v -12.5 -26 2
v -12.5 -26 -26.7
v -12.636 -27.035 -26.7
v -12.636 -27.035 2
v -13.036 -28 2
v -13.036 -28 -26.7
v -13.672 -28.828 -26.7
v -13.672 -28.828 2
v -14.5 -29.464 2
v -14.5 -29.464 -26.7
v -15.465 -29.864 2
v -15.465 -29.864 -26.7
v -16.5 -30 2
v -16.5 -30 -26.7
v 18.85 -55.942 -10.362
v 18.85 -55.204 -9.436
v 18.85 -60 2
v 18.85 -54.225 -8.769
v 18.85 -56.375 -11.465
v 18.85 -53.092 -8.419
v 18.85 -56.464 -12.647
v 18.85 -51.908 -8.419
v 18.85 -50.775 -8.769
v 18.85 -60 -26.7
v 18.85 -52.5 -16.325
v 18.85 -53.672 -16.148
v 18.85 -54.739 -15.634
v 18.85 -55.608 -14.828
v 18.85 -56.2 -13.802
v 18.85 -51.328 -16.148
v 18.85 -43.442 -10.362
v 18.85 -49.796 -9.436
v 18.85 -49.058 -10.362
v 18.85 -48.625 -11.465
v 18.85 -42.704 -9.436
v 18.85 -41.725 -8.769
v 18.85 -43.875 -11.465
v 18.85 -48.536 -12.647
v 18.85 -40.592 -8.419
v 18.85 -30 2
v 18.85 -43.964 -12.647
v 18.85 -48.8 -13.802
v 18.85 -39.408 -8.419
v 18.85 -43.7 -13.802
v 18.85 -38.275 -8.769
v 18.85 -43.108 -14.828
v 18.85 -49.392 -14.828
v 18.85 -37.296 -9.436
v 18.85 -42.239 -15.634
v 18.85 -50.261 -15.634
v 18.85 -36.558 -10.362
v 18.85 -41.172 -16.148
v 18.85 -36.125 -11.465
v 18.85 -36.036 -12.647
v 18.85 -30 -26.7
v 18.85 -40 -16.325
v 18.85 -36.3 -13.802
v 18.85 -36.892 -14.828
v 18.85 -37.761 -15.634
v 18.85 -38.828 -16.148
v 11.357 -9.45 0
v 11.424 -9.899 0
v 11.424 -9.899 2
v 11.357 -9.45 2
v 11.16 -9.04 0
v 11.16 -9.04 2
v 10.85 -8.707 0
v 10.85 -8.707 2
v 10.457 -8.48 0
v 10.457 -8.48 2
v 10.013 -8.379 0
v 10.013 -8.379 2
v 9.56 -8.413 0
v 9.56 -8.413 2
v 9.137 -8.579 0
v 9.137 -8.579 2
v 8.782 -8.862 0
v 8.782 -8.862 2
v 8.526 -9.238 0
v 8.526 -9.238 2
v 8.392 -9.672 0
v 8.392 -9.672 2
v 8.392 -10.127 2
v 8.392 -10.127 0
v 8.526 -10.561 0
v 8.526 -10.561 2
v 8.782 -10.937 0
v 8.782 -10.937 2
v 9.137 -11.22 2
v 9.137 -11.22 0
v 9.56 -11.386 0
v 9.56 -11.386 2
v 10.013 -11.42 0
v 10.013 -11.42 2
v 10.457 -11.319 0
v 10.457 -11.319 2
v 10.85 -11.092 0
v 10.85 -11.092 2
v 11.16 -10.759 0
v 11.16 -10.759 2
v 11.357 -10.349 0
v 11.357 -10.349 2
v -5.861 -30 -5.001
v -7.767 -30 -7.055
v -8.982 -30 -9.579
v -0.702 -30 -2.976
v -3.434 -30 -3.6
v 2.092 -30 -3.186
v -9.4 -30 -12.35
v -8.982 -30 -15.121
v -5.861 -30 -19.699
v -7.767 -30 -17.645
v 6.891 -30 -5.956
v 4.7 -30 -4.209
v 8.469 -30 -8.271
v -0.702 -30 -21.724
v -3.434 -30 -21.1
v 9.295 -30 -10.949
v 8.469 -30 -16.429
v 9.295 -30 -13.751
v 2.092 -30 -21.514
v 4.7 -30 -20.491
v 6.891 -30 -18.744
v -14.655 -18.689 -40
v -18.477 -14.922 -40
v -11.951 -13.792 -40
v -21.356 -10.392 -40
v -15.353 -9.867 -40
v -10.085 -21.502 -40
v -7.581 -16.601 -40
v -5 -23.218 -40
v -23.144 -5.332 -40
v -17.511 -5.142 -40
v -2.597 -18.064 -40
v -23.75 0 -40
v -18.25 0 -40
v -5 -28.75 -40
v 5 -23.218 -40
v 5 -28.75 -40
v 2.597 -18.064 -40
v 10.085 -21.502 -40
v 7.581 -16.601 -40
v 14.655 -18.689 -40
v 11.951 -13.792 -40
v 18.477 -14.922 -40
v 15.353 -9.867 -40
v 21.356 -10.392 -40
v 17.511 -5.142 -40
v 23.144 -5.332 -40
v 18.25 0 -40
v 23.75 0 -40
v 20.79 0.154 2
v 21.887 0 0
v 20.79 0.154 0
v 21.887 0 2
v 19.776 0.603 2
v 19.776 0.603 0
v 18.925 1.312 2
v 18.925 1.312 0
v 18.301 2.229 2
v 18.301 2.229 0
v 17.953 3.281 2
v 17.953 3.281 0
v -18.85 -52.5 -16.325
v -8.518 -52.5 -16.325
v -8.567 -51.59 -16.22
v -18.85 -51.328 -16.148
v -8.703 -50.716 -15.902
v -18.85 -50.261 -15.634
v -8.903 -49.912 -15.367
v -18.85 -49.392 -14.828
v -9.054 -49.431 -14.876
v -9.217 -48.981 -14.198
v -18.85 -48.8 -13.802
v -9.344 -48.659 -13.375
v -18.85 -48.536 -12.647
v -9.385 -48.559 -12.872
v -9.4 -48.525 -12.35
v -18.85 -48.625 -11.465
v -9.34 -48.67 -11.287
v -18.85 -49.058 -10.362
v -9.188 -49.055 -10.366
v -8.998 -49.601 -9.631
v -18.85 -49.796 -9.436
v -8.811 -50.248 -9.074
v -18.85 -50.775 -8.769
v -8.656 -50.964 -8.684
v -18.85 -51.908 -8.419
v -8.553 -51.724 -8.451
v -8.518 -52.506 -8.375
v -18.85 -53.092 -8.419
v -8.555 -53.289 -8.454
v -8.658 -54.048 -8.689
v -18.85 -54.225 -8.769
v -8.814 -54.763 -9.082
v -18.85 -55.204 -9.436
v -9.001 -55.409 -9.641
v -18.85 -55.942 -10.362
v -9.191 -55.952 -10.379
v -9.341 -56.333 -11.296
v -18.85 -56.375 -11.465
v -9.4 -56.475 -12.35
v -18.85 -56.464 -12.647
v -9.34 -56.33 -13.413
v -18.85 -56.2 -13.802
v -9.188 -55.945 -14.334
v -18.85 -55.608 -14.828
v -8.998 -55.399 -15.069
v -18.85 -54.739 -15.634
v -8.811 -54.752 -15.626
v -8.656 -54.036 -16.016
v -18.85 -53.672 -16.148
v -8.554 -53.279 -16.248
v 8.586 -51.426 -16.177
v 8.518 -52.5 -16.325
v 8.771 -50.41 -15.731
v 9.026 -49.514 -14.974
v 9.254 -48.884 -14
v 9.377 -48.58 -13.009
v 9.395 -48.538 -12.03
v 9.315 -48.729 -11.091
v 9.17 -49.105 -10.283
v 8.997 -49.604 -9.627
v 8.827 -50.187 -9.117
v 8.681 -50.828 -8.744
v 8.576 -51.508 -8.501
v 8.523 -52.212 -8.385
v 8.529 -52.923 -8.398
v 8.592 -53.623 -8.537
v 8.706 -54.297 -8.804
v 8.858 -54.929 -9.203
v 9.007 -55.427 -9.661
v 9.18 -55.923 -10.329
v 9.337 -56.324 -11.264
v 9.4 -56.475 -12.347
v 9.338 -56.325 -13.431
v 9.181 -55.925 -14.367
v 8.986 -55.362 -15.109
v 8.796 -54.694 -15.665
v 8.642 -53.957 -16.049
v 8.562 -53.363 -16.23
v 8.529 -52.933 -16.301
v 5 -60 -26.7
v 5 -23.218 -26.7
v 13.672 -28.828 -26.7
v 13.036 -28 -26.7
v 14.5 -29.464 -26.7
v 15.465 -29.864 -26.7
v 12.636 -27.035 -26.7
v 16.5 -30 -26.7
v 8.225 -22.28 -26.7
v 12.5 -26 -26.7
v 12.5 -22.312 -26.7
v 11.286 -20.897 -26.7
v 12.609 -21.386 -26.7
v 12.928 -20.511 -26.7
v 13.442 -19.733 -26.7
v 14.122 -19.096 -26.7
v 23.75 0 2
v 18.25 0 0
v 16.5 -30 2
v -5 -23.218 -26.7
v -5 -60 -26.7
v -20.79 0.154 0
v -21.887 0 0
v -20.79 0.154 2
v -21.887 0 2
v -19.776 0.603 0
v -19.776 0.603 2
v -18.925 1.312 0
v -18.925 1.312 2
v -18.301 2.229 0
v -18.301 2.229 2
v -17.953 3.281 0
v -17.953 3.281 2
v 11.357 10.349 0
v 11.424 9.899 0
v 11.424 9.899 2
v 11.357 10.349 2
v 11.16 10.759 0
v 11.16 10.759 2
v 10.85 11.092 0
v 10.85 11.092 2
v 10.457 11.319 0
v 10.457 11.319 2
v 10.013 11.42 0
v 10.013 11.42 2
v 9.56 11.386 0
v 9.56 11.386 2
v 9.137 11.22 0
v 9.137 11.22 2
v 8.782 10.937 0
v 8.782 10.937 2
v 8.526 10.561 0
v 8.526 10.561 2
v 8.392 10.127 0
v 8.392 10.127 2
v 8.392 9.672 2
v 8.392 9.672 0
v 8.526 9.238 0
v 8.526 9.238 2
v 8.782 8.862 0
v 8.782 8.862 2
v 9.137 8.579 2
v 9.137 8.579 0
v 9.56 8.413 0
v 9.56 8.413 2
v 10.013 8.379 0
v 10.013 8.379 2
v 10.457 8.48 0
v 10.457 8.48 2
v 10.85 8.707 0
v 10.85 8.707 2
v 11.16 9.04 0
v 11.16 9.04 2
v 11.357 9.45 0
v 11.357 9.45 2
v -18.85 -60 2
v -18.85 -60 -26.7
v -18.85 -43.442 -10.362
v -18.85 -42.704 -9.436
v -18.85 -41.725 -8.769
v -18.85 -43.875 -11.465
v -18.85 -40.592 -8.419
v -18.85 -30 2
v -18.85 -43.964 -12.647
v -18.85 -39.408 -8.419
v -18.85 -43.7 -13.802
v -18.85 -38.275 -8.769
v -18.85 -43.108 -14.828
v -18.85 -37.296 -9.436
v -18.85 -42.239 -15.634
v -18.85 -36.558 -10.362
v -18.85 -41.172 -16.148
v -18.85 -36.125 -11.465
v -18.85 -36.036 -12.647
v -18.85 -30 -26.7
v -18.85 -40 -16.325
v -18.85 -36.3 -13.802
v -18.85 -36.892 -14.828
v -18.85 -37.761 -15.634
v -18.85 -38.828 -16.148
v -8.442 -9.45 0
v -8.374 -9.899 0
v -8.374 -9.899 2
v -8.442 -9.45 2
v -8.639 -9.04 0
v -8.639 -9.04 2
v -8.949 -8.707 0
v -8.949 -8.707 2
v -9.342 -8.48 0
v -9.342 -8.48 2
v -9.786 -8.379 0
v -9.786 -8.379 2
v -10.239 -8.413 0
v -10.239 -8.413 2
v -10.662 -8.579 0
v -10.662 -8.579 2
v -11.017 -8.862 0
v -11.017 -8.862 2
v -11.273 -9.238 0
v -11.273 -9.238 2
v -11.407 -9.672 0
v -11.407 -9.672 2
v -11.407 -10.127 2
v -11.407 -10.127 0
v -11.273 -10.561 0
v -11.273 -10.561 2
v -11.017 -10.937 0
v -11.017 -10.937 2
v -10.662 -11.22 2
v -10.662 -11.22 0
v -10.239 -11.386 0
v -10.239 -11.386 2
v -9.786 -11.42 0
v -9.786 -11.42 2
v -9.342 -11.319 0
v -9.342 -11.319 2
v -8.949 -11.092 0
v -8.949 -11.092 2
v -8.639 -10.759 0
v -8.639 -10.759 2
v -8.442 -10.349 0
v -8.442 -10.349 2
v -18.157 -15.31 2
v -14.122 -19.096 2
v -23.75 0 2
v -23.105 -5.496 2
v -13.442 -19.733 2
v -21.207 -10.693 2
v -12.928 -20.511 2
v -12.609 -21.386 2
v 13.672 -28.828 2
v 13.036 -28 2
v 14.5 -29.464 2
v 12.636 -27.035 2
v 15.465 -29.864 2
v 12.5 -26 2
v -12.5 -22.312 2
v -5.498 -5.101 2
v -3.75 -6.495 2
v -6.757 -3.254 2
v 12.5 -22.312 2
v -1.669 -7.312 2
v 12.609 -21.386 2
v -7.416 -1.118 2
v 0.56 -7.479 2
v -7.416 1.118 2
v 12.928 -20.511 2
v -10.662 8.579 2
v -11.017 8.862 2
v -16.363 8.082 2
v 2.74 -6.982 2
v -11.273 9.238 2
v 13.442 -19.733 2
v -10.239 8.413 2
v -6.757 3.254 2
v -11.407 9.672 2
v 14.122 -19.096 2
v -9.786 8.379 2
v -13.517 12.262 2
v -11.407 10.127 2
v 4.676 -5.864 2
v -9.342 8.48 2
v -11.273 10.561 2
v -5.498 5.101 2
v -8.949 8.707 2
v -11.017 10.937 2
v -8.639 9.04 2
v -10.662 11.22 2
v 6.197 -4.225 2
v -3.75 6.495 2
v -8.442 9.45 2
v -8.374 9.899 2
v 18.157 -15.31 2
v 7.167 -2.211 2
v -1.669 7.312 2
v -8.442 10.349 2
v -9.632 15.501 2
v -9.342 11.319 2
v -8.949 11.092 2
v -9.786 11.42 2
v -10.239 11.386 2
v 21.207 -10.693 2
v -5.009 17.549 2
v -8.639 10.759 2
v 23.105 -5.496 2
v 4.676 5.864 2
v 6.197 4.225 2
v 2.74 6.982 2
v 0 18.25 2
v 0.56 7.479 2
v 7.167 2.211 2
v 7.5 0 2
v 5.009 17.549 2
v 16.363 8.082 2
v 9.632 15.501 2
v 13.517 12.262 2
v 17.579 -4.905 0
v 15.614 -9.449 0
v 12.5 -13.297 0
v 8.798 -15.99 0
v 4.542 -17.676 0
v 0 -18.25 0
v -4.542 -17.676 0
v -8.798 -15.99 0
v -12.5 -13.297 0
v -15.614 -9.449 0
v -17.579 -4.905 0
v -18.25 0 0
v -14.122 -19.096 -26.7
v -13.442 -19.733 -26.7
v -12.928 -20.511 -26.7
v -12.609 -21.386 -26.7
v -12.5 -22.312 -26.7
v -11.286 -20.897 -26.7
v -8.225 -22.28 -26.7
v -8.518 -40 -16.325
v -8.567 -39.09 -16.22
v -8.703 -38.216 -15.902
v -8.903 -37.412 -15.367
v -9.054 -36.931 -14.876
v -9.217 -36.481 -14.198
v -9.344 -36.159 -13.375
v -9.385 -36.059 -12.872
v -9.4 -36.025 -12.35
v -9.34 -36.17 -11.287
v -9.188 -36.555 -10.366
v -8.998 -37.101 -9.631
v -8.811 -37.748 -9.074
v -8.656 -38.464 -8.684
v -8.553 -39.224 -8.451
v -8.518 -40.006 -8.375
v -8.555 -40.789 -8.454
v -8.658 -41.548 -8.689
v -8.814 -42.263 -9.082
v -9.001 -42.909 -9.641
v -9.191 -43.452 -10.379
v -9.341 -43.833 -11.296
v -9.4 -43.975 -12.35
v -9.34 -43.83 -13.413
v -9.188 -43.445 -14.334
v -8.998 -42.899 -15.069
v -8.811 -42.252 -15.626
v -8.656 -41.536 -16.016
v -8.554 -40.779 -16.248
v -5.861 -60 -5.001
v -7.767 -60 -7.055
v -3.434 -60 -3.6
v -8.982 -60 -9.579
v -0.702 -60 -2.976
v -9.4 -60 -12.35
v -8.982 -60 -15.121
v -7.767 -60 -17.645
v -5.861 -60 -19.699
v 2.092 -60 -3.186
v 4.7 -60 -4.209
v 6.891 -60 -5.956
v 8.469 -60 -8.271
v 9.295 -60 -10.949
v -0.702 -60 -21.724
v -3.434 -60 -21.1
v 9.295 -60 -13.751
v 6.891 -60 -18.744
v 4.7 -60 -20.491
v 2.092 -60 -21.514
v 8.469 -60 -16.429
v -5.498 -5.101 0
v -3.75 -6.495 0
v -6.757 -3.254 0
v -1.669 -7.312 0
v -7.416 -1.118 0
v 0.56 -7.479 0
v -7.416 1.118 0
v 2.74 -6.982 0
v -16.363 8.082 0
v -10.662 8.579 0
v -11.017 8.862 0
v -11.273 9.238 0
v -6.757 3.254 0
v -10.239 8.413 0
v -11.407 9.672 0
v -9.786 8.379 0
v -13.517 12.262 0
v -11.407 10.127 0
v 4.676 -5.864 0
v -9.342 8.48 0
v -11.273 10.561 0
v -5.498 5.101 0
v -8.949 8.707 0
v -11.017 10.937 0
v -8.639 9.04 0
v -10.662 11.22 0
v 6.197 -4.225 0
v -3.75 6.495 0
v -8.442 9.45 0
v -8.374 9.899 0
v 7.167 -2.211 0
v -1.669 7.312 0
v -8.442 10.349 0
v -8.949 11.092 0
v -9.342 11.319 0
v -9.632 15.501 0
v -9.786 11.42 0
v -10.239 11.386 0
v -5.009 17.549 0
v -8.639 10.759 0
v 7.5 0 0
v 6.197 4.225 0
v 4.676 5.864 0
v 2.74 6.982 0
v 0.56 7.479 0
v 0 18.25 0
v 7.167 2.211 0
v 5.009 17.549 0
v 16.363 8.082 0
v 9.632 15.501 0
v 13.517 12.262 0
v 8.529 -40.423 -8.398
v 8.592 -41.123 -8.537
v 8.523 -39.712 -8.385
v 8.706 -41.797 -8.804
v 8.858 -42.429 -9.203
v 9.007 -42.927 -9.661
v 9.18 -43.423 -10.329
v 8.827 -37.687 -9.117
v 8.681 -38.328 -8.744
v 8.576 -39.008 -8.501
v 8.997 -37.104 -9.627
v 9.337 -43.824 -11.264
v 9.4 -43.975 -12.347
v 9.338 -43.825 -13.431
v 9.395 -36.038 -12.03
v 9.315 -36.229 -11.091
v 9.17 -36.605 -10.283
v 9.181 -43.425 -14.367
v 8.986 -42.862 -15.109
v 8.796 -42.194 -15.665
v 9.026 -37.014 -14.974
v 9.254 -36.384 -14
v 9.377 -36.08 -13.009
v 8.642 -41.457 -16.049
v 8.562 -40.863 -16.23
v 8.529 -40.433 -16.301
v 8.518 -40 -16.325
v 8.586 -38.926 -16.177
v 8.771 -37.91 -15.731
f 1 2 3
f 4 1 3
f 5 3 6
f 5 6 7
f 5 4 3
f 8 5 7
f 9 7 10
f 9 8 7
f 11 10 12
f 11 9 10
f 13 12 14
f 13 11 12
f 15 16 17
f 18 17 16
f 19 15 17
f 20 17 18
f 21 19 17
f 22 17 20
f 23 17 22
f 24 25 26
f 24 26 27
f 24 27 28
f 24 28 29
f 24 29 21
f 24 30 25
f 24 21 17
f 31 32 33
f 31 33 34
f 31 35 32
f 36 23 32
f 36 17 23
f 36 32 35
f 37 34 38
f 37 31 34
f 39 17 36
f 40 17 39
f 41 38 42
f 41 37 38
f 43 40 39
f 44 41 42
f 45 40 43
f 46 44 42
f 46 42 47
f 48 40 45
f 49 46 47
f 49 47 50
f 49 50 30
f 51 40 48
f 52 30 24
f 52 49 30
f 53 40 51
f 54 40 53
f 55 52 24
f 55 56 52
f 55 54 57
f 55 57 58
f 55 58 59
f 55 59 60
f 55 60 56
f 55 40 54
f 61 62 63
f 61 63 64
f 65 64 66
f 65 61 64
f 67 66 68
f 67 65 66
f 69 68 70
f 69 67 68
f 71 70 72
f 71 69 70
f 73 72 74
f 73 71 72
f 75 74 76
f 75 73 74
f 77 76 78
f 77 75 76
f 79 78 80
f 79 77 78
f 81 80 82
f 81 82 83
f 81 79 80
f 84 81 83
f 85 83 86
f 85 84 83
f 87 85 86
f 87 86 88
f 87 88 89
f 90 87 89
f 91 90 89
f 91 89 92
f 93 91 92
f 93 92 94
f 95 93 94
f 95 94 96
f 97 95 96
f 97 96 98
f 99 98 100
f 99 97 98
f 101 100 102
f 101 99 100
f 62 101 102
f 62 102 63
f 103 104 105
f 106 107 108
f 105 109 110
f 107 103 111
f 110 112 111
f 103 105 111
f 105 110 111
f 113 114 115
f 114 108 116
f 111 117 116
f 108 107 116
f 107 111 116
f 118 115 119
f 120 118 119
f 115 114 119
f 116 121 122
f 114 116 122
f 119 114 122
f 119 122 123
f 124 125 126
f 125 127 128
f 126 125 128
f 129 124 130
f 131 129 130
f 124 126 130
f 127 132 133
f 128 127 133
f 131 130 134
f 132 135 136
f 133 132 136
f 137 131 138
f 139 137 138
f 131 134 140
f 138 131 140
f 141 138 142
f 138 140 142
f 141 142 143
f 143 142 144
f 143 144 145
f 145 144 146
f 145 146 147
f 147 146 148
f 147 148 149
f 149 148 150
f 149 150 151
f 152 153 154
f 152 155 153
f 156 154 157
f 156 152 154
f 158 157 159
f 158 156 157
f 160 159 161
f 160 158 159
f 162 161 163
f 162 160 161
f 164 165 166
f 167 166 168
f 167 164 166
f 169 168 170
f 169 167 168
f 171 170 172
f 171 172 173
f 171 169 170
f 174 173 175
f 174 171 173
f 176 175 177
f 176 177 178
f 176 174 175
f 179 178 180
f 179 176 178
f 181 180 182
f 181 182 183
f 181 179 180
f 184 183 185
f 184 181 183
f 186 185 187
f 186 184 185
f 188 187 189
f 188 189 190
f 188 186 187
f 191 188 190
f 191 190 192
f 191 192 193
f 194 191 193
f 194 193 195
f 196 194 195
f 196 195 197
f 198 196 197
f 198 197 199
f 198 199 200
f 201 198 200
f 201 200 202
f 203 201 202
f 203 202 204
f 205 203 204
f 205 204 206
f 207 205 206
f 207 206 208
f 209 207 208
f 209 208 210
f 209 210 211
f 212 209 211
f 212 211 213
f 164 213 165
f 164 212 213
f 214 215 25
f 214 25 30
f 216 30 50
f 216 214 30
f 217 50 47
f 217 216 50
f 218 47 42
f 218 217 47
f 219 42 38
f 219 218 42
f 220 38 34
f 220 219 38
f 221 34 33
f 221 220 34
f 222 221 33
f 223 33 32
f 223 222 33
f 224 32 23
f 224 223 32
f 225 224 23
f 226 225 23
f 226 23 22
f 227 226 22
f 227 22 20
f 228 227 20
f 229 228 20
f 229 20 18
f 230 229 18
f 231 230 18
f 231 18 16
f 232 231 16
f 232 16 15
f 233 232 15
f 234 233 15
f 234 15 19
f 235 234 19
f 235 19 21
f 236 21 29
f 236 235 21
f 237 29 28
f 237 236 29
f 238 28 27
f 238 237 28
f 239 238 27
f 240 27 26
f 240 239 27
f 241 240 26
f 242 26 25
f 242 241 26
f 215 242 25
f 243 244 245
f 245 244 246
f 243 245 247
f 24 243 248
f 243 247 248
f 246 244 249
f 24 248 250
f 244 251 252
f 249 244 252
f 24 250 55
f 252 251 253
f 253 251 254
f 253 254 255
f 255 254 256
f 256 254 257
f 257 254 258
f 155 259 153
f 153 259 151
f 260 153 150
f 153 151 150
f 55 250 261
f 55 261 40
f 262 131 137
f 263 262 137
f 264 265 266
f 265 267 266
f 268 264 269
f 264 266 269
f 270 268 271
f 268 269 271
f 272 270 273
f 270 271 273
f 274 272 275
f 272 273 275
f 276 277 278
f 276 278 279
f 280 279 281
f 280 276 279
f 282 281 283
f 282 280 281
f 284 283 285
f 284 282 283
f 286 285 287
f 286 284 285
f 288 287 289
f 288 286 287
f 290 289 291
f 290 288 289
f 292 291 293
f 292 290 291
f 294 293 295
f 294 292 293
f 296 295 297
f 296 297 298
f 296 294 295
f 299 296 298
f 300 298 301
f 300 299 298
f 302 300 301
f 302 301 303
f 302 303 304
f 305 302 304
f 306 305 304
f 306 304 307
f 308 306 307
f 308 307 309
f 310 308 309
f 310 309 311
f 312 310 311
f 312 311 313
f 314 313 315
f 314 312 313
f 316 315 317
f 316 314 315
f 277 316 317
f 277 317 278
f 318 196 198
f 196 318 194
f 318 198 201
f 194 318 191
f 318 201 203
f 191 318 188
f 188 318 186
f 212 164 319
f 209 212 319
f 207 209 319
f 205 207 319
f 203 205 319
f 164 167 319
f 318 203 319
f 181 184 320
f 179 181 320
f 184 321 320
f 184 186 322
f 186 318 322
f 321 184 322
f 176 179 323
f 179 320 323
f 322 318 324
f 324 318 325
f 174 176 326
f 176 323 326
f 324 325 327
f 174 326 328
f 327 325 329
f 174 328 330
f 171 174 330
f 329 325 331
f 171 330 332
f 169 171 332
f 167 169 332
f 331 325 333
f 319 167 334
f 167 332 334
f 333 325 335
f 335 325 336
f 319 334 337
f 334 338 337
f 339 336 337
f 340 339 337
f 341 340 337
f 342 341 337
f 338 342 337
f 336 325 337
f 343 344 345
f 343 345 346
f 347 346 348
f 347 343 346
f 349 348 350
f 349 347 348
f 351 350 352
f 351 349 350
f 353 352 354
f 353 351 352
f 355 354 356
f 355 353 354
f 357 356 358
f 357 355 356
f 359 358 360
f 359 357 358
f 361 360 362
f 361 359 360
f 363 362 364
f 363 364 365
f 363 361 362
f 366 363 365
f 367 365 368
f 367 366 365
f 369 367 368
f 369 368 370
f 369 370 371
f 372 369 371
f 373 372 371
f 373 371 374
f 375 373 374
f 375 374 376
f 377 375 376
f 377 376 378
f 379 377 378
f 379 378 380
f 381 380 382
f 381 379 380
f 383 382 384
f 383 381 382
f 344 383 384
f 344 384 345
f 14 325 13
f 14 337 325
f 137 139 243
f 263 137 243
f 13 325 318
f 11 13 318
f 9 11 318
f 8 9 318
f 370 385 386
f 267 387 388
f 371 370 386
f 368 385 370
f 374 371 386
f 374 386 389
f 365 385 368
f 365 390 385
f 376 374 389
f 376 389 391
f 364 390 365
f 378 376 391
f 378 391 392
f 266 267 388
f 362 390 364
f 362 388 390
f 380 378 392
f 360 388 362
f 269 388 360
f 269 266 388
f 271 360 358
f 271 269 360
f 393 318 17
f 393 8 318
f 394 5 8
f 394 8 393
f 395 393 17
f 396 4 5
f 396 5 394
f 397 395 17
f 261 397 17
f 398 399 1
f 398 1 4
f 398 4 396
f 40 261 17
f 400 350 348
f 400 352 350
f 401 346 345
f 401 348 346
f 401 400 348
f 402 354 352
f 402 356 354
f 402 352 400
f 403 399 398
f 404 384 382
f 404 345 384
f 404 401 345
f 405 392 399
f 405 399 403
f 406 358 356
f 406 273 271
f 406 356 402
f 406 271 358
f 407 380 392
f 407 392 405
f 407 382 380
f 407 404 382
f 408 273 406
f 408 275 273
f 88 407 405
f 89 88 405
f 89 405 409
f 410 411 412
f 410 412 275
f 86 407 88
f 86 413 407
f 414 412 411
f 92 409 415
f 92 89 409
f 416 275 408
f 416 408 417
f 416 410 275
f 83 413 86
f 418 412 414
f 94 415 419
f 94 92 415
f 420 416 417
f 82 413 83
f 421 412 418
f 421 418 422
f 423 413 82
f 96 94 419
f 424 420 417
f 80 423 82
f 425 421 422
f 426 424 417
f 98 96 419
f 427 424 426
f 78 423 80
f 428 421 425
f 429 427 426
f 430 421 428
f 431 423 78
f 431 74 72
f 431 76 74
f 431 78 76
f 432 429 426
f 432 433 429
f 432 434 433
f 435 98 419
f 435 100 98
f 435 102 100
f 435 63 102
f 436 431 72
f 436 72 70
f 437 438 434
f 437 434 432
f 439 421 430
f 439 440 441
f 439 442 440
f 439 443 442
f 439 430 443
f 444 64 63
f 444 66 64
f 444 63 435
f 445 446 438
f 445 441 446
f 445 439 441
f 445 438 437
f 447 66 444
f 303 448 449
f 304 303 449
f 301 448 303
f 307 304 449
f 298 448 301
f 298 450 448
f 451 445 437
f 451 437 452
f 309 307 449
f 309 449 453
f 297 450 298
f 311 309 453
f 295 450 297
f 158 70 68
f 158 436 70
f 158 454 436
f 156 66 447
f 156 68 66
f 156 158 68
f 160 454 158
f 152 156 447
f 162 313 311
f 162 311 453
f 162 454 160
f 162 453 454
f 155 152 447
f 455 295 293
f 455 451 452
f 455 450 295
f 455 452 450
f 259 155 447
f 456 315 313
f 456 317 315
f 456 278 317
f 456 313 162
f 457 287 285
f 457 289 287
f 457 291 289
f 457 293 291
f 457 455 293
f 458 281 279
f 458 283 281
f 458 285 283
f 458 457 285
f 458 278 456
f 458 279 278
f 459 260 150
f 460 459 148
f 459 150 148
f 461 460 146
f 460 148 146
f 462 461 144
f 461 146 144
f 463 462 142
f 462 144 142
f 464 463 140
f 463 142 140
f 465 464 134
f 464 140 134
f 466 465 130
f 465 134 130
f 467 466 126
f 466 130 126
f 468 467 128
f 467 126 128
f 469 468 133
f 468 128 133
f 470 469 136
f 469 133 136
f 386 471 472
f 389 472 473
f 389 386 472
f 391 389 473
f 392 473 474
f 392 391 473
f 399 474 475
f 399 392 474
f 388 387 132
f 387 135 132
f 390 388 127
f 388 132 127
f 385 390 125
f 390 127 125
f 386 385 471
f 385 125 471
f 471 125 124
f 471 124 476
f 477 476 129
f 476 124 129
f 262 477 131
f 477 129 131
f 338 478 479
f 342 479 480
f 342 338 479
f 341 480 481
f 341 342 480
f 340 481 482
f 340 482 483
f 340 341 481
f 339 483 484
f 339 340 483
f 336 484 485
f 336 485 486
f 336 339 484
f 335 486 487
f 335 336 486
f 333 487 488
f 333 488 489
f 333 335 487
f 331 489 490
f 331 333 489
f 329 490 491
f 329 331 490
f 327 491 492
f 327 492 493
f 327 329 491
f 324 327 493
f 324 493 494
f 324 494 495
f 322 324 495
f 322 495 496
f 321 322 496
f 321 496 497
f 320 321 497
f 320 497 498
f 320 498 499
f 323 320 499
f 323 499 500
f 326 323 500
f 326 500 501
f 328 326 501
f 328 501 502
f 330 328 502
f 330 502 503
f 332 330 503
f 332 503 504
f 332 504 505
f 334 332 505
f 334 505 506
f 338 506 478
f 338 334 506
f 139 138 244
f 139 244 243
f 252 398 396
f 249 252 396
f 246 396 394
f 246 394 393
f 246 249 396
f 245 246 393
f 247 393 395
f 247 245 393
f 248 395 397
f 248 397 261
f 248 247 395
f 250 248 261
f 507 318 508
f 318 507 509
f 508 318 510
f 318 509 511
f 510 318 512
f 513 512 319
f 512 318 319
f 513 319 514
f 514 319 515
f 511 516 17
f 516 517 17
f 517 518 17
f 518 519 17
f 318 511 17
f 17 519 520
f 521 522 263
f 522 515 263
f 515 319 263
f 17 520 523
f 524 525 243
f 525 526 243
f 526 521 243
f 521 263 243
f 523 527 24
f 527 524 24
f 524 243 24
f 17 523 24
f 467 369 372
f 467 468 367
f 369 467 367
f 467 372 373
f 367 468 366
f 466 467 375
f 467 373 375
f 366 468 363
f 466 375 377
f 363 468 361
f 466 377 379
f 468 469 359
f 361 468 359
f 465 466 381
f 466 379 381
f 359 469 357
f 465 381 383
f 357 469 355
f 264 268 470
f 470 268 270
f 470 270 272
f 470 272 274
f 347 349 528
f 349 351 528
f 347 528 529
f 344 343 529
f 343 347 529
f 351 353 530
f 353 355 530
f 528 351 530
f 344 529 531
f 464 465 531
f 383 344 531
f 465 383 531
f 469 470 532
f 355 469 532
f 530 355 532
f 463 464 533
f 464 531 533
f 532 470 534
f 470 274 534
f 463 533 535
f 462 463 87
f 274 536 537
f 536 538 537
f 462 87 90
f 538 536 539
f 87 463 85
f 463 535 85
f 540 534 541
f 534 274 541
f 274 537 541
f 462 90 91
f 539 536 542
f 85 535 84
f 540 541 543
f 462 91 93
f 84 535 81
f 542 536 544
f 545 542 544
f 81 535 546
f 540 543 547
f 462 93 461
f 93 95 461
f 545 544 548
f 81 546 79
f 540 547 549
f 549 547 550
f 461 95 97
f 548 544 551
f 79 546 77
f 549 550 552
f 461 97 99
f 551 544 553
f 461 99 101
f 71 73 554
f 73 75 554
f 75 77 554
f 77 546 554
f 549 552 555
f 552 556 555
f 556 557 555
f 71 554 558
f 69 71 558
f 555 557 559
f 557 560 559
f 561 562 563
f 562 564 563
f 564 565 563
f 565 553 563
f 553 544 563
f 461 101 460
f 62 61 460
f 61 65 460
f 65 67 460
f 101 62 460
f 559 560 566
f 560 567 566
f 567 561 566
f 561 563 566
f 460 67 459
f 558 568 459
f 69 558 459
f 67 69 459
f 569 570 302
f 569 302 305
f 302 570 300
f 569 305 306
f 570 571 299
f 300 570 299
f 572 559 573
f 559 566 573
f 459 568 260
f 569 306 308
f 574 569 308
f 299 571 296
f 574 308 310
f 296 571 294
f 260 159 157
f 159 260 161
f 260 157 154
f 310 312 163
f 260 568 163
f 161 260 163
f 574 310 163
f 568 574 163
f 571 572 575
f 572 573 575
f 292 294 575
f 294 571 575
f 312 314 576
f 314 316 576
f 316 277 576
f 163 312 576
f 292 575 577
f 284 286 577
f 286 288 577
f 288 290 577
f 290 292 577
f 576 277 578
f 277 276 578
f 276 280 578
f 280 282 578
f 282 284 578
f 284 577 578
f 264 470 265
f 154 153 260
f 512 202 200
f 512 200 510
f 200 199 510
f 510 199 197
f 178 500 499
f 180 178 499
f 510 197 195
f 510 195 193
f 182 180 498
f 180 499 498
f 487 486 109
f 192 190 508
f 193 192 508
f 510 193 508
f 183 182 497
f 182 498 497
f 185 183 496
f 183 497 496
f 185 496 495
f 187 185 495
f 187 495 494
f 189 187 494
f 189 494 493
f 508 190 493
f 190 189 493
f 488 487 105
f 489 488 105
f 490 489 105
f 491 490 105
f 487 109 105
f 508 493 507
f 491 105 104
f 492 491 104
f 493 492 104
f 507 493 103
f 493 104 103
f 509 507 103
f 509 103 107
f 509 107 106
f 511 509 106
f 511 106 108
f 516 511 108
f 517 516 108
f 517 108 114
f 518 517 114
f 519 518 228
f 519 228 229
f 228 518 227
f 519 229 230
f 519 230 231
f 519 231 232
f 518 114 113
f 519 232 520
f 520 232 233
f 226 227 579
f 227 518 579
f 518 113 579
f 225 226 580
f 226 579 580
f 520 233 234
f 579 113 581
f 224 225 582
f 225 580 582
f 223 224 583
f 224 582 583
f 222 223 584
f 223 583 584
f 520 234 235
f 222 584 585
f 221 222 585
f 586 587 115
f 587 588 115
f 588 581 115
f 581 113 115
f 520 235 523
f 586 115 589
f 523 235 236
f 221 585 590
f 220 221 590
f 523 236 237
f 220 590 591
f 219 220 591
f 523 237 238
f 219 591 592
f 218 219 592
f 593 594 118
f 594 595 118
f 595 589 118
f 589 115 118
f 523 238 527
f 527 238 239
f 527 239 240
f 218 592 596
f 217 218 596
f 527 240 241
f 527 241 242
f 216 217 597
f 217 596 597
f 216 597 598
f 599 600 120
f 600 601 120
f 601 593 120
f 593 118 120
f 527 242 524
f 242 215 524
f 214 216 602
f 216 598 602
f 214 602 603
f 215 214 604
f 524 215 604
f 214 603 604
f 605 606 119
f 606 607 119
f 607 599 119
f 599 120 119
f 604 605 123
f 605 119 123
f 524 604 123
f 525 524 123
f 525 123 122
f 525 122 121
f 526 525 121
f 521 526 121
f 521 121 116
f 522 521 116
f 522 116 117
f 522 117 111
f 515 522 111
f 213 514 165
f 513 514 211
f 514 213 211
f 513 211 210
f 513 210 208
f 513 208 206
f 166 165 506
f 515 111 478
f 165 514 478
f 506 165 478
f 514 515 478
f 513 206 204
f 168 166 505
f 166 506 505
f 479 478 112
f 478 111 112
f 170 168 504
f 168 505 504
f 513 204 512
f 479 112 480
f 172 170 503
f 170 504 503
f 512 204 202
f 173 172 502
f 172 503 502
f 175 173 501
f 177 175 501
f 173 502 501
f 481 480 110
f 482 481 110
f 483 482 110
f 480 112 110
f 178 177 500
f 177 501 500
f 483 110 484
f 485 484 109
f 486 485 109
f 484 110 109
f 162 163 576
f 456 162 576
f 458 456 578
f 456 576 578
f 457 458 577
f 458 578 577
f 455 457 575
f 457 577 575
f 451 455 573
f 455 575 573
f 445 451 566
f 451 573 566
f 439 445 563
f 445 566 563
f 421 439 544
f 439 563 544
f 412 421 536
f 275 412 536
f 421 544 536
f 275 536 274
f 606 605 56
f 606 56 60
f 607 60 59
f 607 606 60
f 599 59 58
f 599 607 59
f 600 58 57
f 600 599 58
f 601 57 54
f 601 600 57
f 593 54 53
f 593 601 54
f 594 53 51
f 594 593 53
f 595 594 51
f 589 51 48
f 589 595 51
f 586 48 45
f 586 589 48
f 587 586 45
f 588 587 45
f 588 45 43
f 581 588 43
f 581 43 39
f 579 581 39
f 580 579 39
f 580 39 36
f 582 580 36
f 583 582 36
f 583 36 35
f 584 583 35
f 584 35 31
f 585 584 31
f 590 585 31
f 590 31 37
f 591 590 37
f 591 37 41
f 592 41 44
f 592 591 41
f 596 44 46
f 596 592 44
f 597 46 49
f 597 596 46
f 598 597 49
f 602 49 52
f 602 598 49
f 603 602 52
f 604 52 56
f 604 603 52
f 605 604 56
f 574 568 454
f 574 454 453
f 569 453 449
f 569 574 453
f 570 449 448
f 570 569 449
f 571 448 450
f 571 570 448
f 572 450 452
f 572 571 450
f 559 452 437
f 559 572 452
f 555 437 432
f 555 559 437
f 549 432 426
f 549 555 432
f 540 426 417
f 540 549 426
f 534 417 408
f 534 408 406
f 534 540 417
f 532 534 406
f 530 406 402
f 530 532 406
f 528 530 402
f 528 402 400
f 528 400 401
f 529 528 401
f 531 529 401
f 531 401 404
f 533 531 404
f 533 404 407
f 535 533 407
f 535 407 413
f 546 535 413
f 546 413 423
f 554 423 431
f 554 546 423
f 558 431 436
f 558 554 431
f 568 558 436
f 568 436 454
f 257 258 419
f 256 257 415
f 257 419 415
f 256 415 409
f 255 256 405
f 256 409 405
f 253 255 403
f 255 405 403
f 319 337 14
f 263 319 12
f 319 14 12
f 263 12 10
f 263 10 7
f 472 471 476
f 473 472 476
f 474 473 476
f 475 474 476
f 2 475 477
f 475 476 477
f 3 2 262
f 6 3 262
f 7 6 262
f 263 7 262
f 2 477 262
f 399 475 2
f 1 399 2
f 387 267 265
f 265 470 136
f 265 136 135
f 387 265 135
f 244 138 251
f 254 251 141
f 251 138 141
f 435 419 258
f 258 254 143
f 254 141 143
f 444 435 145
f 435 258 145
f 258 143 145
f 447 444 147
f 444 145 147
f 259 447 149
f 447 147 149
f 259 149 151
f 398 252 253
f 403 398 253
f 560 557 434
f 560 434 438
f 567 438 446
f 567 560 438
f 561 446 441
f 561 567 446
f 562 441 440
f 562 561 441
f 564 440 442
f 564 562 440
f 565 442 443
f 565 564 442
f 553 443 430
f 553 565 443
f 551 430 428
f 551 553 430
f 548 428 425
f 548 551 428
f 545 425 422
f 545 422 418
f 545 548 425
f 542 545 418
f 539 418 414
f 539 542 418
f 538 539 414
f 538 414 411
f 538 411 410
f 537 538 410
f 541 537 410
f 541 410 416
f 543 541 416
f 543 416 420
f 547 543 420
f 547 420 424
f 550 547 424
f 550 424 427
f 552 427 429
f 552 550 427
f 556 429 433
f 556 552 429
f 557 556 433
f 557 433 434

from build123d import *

# Parameters (mm, degrees)
SKETCH2_R               = 1.525
SKETCH2_R_2             = 7.5
BOSS_EXTRUDE3_DEPTH     = 2
BOSS_EXTRUDE4_START     = -40
BOSS_EXTRUDE4_DEPTH     = 42
BOSS_EXTRUDE6_START     = -30
SKETCH7_W               = 37.7
SKETCH7_H               = 28.7
SKETCH7_R               = 9.4
BOSS_EXTRUDE6_DEPTH     = 30
BOSS_EXTRUDE7_START     = -26.7
BOSS_EXTRUDE7_DEPTH     = 26.7
CUT_EXTRUDE1_DEPTH      = 76.921423195
CUT_EXTRUDE1_DEPTH_BACK = 76.921423195
SKETCH6_R               = 3.975
RIB3_START              = -5
RIB3_DEPTH              = 10
FILLET2_R               = 4


# Read off the part's stored shape, not the designer's step: Rib3
with BuildPart() as part:
    # Sketch2 → Boss-Extrude3 (new body)
    with BuildSketch(Plane.XY):
        with BuildLine():
            Line((12.5, -30), (12.5, -13.297086147))
            ThreePointArc((12.5, -13.297086147), (0, 18.25), (-12.5, -13.297086147))
            Line((-12.5, -13.297086147), (-12.5, -30))
            Line((-12.5, -30), (12.5, -30))
        make_face()
        with Locations((9.899494937, -9.899494937)):
            Circle(SKETCH2_R, mode=Mode.SUBTRACT)
        with Locations((-9.899494937, -9.899494937)):
            Circle(SKETCH2_R, mode=Mode.SUBTRACT)
        with Locations((-9.899494937, 9.899494937)):
            Circle(SKETCH2_R, mode=Mode.SUBTRACT)
        with Locations((9.899494937, 9.899494937)):
            Circle(SKETCH2_R, mode=Mode.SUBTRACT)
        Circle(SKETCH2_R_2, mode=Mode.SUBTRACT)
    extrude(amount=BOSS_EXTRUDE3_DEPTH)

    # Sketch3 → Boss-Extrude4 (add)
    with BuildSketch(Plane.XY.offset(BOSS_EXTRUDE4_START)):
        with BuildLine():
            Line((23.75, 0), (18.25, 0))
            ThreePointArc((18.25, 0), (0, -18.25), (-18.25, 0))
            Line((-18.25, 0), (-23.75, 0))
            ThreePointArc((-23.75, 0), (0, -23.75), (23.75, 0))
        make_face()
    extrude(amount=BOSS_EXTRUDE4_DEPTH)

    # Sketch7 → Boss-Extrude6 (add)
    with BuildSketch(Plane(origin=(0, 0, 0), x_dir=(1, 0, 0), z_dir=(0, 1, 0)).offset(BOSS_EXTRUDE6_START)):
        with Locations((0, 12.35)):
            Rectangle(SKETCH7_W, SKETCH7_H)
        with Locations(Location((0, 12.35, 0), (0, 0, 180))):
            Circle(SKETCH7_R, mode=Mode.SUBTRACT)
    extrude(amount=-BOSS_EXTRUDE6_DEPTH)

    # Sketch2<8> → Boss-Extrude7 (add)
    with BuildSketch(Plane.XY.offset(BOSS_EXTRUDE7_START)):
        with BuildLine():
            Line((12.5, -30), (12.5, -13.297086147))
            ThreePointArc((12.5, -13.297086147), (0, -18.25), (-12.5, -13.297086147))
            Line((-12.5, -13.297086147), (-12.5, -30))
            Line((-12.5, -30), (12.5, -30))
        make_face()
    extrude(amount=BOSS_EXTRUDE7_DEPTH)

    # Sketch6 → Cut-Extrude1 (cut, two sides: drawn at the far end of the back side and taken through both)
    with BuildSketch(Plane(origin=(0, 0, 0), x_dir=(0, 0, -1), z_dir=(1, 0, 0)).offset(-CUT_EXTRUDE1_DEPTH_BACK)):
        with Locations((12.35, -40)):
            Circle(SKETCH6_R)
        with Locations((12.35, -52.5)):
            Circle(SKETCH6_R)
    extrude(amount=CUT_EXTRUDE1_DEPTH + CUT_EXTRUDE1_DEPTH_BACK, mode=Mode.SUBTRACT)

    # Rib3 outline → Rib3 (add)
    with BuildSketch(Plane(origin=(0, -60, 0), x_dir=(0, -1, 0), z_dir=(-1, 0, 0)).offset(RIB3_START)):
        Polygon((-38, -40), (-31.25, -40), (0, -26.7), (-38, -26.7), align=None)
    extrude(amount=RIB3_DEPTH)

    # Fillet2
    fillet2_edges = [part.edges().sort_by_distance(p)[0] for p in [
        (12.5, -30, -12.35),
        (-12.5, -30, -12.35),
        (-18.25, 0, 1),
        (12.5, -20.194368027, -12.35),
        (18.25, 0, 1),
        (-12.5, -20.194368027, -12.35),
    ]]
    fillet(fillet2_edges, radius=FILLET2_R)


solid = part.part
